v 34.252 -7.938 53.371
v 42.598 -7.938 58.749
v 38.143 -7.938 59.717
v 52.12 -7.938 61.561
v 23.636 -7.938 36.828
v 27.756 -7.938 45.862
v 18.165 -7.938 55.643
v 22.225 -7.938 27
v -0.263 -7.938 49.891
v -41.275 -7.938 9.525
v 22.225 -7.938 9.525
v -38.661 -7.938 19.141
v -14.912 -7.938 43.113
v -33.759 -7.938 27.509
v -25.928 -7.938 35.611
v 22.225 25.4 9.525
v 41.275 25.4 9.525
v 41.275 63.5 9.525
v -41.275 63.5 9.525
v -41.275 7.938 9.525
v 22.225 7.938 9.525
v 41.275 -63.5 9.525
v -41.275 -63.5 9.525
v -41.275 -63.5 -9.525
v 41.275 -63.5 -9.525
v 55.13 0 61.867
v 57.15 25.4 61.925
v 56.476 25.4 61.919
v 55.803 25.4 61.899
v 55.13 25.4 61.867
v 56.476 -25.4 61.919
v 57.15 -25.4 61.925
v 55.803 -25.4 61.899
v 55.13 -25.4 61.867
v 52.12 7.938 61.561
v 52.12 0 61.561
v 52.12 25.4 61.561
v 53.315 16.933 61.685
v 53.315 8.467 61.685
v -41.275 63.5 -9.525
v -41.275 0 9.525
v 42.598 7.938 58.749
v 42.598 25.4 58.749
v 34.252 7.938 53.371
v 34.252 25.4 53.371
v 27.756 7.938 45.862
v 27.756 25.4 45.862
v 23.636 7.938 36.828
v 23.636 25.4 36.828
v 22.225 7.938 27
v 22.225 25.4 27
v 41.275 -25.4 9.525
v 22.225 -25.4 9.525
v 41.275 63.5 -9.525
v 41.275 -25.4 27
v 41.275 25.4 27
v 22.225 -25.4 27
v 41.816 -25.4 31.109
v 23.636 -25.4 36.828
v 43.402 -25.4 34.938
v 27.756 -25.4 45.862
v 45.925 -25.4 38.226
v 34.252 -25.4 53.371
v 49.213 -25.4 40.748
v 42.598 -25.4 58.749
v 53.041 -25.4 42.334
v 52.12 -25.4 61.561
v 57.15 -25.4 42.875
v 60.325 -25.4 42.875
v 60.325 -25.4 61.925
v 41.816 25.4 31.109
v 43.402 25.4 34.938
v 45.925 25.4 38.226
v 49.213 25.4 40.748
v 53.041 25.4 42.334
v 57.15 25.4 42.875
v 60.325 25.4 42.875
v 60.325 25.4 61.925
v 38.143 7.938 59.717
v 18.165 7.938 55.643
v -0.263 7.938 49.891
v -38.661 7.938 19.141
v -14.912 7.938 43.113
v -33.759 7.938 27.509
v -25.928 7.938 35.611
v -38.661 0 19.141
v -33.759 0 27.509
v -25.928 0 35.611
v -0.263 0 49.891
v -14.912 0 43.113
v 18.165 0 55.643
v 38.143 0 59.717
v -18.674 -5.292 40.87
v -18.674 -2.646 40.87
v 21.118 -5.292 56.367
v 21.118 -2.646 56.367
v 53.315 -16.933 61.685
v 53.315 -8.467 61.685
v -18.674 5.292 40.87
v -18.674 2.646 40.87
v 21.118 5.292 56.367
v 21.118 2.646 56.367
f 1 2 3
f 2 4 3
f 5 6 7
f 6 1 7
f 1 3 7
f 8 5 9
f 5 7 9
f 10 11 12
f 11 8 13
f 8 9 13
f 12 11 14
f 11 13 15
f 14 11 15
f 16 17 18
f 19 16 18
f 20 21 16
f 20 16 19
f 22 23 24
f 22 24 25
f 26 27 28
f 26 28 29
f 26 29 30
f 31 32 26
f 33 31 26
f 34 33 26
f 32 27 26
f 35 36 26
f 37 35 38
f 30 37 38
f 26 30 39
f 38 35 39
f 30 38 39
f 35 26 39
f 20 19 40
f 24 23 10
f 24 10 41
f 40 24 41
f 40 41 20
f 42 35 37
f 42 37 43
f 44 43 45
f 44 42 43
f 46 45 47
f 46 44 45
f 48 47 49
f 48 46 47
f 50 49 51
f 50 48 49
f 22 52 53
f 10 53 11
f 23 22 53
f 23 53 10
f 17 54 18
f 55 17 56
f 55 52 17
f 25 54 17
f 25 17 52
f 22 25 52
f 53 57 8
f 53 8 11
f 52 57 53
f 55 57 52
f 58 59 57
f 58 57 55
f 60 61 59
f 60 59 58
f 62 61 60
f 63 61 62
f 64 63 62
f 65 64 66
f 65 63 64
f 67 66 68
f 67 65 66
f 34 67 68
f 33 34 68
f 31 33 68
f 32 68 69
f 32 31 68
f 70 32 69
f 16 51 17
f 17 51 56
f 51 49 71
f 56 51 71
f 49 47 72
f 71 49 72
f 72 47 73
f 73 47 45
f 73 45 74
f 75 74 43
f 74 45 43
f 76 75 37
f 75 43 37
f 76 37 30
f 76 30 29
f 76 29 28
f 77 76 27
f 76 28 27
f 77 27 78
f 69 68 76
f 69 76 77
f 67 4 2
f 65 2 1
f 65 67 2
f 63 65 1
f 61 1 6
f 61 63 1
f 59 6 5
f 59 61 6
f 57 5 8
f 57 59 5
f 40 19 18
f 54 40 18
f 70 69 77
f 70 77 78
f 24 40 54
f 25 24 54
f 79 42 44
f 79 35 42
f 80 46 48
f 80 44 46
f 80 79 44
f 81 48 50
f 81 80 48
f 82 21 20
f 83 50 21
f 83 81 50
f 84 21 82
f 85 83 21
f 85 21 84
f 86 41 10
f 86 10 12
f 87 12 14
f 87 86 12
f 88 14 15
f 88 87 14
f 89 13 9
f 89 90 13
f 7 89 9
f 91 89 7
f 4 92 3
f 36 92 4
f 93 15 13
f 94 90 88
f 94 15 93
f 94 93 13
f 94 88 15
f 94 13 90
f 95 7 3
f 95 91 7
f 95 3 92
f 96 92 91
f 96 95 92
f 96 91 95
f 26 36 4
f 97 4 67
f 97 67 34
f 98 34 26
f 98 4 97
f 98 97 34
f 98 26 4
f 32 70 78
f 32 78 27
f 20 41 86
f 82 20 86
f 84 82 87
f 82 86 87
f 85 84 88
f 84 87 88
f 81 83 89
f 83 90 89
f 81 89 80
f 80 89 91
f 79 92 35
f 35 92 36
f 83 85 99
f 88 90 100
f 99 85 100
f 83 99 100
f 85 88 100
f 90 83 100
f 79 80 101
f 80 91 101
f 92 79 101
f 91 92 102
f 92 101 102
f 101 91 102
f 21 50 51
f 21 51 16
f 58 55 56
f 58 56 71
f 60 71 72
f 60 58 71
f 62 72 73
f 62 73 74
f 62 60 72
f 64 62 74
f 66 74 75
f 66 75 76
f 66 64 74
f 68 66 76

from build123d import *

# Parameters (mm, degrees)
F1_DEPTH = 63.5
F2_DEPTH = 25.4
F3_DEPTH = 7.9375


with BuildPart() as f1:
    # F0 (on Front) → F1 (new body, symmetric)
    with BuildSketch(Plane.XZ):
        Polygon((-41.275, 9.525), (-41.275, -9.525), (41.275, -9.525), (41.275, 9.525), (22.225, 9.525), align=None)
    extrude(amount=F1_DEPTH, both=True)

    # F0 (on Front) → F2 (join, symmetric)
    with BuildSketch(Plane.XZ):
        with BuildLine():
            Line((22.225, 9.525), (41.275, 9.525))
            Line((41.275, 9.525), (41.275, 27.0002))
            ThreePointArc((41.275, 27.0002), (45.9246798487, 38.2255201513), (57.15, 42.8752))
            Line((57.15, 42.8752), (60.325, 42.8752))
            Line((60.325, 42.8752), (60.325, 61.9252))
            Line((60.325, 61.9252), (57.15, 61.9252))
            ThreePointArc((57.15, 61.9252), (56.1396828134, 61.9105836155), (55.1302112781, 61.8667466962))
            add(Edge.make_bspline(
                [(52.1201627653, 61.5611080088), (53.4052318072, 61.69652188), (54.4228886403, 61.7953477122), (55.1302112781, 61.8667466962)],
                knots=[0.8216641419, 0.8216641419, 0.8216641419, 0.8216641419, 0.8804984928, 0.8804984928, 0.8804984928, 0.8804984928], degree=3))
            ThreePointArc((52.1201627653, 61.5611080088), (30.7357738101, 49.8484883339), (22.225, 27.0002))
            Line((22.225, 27.0002), (22.225, 9.525))
        make_face()
    extrude(amount=F2_DEPTH, both=True)

    # F0 (on Front) → F3 (join, symmetric)
    with BuildSketch(Plane.XZ):
        with BuildLine():
            add(Edge.make_bspline(
                [(-41.275, 9.525), (-35.930112491, 50.6426220419), (34.1732467865, 59.6699556353), (52.1201627653, 61.5611080088)],
                knots=[0, 0, 0, 0, 0.8216641419, 0.8216641419, 0.8216641419, 0.8216641419], degree=3))
            Line((-41.275, 9.525), (22.225, 9.525))
            Line((22.225, 9.525), (22.225, 27.0002))
            ThreePointArc((22.225, 27.0002), (30.7357738101, 49.8484883339), (52.1201627653, 61.5611080088))
        make_face()
    extrude(amount=F3_DEPTH, both=True)


solid = f1.part
